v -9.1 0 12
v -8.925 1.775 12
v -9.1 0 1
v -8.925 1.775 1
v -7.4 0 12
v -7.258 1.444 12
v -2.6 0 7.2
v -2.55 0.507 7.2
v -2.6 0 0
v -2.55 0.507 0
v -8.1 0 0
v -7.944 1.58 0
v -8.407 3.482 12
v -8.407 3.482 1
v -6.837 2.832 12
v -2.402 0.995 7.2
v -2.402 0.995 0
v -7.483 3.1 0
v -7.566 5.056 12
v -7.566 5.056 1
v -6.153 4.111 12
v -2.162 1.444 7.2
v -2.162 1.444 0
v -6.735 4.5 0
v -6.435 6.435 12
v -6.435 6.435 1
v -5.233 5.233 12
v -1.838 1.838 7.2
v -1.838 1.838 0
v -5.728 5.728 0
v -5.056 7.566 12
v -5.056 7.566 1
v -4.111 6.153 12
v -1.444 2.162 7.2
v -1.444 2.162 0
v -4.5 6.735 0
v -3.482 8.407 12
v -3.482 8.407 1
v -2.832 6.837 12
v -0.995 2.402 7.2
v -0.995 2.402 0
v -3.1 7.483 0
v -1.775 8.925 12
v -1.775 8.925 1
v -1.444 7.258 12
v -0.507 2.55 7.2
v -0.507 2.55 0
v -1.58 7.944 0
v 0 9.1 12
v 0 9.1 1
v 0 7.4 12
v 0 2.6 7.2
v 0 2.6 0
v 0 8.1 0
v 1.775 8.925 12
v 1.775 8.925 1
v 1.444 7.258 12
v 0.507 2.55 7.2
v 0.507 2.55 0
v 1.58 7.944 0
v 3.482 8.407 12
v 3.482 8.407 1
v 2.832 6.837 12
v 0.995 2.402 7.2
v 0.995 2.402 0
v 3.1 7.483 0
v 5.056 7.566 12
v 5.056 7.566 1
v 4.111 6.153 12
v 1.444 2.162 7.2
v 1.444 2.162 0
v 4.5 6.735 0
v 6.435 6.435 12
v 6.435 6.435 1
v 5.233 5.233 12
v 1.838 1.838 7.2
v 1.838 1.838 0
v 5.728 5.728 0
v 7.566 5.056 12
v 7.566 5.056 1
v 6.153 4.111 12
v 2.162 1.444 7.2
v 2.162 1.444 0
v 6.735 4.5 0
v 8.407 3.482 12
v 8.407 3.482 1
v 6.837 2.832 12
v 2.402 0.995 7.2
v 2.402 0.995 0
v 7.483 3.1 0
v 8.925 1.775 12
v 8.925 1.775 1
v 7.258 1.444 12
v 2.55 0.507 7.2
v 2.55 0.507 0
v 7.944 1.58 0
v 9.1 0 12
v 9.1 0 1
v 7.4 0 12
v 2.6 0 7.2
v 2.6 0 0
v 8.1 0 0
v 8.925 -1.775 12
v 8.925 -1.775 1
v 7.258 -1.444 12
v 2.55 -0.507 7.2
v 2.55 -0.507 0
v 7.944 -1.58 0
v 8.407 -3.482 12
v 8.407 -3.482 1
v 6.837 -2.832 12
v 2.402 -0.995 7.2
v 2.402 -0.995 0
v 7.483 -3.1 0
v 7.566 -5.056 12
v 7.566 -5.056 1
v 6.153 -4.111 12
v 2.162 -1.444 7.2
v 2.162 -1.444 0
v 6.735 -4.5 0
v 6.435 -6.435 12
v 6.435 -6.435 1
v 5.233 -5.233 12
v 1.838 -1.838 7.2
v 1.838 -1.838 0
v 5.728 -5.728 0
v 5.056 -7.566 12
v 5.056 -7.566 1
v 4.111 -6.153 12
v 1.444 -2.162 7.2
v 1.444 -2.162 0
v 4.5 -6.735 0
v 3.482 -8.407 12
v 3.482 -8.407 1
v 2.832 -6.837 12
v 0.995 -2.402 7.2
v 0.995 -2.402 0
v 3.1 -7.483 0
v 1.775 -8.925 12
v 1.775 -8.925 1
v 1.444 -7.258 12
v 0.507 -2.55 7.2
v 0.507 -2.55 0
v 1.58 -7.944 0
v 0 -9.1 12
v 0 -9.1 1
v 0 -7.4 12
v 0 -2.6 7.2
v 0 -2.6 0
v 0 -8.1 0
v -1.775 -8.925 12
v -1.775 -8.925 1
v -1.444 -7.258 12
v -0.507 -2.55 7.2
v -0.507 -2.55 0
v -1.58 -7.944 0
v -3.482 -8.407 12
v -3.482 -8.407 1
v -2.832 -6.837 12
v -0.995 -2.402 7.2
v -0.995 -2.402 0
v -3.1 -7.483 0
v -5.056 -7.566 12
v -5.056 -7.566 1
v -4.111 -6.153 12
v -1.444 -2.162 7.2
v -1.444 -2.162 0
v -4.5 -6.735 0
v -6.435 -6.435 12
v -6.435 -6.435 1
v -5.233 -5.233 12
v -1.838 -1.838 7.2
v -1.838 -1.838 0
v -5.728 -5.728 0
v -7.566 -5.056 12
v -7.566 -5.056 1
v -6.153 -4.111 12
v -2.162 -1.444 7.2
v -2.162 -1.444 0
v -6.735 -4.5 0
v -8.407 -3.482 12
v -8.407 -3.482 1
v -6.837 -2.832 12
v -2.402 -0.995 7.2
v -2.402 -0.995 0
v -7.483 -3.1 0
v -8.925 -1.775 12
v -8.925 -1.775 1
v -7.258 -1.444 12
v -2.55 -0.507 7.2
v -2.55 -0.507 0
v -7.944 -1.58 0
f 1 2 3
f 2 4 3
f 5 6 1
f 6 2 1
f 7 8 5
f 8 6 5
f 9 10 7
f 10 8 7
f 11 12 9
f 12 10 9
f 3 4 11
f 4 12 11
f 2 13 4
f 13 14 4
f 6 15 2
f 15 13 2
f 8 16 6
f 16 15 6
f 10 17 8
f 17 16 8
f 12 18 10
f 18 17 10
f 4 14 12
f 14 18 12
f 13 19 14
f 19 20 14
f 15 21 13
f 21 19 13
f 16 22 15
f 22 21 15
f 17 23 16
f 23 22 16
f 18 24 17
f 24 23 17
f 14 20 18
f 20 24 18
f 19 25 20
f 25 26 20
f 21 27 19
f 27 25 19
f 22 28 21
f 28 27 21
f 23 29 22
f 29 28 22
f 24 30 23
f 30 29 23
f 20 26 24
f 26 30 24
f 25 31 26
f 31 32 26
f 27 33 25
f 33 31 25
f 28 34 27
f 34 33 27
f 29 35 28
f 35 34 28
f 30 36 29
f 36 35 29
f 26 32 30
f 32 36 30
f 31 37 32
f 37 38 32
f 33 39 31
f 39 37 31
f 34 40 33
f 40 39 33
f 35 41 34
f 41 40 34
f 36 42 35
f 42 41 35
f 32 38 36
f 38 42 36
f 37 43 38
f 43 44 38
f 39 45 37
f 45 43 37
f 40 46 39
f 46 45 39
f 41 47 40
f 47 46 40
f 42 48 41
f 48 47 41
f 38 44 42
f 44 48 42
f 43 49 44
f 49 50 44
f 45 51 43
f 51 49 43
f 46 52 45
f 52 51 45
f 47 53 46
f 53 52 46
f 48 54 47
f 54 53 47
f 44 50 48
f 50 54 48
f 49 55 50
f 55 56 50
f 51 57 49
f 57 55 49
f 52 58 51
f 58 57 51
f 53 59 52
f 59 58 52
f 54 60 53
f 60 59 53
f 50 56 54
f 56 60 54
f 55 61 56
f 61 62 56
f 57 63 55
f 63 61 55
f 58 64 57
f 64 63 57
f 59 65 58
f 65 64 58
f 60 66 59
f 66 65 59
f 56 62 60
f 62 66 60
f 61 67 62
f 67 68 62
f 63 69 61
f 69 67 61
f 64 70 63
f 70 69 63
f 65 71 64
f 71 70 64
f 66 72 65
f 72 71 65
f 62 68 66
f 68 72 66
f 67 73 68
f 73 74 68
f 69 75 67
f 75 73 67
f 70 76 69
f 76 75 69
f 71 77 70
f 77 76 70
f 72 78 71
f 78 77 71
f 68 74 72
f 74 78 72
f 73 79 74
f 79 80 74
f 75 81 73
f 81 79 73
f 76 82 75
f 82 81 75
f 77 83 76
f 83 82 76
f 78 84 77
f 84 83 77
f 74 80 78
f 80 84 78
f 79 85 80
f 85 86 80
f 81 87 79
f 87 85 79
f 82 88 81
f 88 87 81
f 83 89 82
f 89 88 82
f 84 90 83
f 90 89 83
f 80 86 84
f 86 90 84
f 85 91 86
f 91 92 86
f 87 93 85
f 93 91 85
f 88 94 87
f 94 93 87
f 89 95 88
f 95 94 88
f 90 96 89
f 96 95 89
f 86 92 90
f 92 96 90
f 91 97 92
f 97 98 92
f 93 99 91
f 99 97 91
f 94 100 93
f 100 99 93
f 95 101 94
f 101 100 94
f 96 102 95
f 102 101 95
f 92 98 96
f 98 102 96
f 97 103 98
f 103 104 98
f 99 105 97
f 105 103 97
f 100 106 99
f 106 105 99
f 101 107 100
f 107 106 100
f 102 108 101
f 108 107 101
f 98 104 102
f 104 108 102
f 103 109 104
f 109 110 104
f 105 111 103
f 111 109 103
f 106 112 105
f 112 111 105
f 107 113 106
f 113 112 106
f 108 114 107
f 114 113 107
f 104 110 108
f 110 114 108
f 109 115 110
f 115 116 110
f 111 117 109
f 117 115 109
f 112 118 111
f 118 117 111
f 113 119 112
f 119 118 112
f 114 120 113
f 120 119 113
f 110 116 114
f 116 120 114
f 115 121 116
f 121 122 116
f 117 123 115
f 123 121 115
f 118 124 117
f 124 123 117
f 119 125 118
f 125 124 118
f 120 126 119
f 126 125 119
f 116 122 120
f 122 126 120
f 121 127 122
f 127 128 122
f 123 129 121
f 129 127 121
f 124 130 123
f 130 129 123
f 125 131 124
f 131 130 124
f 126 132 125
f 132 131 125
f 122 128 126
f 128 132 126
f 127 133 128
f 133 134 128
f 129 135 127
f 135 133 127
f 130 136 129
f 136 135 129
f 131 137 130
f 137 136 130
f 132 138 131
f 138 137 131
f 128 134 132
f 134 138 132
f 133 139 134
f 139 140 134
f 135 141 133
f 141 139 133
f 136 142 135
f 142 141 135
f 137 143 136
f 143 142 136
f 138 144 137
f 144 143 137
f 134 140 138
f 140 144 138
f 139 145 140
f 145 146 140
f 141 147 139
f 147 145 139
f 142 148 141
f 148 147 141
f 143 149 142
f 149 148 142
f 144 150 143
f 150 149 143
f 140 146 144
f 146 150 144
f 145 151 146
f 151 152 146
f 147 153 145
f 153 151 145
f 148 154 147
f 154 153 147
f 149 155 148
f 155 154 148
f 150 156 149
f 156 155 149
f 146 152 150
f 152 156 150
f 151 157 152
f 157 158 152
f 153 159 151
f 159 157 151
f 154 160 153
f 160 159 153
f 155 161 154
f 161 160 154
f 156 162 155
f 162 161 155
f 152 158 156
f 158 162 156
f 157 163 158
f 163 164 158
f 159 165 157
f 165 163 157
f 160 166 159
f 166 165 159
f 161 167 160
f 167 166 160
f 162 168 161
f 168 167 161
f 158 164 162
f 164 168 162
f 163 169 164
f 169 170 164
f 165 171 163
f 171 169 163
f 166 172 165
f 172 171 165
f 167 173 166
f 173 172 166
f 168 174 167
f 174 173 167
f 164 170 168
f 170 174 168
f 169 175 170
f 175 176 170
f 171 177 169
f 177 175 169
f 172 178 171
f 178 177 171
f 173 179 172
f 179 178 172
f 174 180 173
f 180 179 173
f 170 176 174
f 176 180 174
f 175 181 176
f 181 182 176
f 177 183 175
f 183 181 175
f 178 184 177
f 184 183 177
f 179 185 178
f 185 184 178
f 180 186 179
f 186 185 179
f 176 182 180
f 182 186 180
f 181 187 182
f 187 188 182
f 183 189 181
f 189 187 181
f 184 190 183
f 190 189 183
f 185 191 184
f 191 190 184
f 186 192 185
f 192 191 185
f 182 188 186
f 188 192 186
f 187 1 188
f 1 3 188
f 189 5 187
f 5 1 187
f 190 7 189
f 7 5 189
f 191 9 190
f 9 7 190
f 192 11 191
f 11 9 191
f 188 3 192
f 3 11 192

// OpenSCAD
$fn = 32;

// ----------------------------------------------------------------------
// Form washer: countersunk washer, 18.2 mm outside, 5.2 mm bore
// ----------------------------------------------------------------------

// --- parameters (mm) ---
revolve_angle = 360;      // full turn around the Z axis
profile_points = 6;       // points of the closed outline

profile = [[2.6, 0], [8.1, 0], [9.1, 1], [9.1, 12], [7.4, 12], [2.6, 7.2]];  // single closed polygon, 6 points, counter clockwise

// --- the one profile operation ---
rotate_extrude(angle = revolve_angle) polygon(points = profile);
